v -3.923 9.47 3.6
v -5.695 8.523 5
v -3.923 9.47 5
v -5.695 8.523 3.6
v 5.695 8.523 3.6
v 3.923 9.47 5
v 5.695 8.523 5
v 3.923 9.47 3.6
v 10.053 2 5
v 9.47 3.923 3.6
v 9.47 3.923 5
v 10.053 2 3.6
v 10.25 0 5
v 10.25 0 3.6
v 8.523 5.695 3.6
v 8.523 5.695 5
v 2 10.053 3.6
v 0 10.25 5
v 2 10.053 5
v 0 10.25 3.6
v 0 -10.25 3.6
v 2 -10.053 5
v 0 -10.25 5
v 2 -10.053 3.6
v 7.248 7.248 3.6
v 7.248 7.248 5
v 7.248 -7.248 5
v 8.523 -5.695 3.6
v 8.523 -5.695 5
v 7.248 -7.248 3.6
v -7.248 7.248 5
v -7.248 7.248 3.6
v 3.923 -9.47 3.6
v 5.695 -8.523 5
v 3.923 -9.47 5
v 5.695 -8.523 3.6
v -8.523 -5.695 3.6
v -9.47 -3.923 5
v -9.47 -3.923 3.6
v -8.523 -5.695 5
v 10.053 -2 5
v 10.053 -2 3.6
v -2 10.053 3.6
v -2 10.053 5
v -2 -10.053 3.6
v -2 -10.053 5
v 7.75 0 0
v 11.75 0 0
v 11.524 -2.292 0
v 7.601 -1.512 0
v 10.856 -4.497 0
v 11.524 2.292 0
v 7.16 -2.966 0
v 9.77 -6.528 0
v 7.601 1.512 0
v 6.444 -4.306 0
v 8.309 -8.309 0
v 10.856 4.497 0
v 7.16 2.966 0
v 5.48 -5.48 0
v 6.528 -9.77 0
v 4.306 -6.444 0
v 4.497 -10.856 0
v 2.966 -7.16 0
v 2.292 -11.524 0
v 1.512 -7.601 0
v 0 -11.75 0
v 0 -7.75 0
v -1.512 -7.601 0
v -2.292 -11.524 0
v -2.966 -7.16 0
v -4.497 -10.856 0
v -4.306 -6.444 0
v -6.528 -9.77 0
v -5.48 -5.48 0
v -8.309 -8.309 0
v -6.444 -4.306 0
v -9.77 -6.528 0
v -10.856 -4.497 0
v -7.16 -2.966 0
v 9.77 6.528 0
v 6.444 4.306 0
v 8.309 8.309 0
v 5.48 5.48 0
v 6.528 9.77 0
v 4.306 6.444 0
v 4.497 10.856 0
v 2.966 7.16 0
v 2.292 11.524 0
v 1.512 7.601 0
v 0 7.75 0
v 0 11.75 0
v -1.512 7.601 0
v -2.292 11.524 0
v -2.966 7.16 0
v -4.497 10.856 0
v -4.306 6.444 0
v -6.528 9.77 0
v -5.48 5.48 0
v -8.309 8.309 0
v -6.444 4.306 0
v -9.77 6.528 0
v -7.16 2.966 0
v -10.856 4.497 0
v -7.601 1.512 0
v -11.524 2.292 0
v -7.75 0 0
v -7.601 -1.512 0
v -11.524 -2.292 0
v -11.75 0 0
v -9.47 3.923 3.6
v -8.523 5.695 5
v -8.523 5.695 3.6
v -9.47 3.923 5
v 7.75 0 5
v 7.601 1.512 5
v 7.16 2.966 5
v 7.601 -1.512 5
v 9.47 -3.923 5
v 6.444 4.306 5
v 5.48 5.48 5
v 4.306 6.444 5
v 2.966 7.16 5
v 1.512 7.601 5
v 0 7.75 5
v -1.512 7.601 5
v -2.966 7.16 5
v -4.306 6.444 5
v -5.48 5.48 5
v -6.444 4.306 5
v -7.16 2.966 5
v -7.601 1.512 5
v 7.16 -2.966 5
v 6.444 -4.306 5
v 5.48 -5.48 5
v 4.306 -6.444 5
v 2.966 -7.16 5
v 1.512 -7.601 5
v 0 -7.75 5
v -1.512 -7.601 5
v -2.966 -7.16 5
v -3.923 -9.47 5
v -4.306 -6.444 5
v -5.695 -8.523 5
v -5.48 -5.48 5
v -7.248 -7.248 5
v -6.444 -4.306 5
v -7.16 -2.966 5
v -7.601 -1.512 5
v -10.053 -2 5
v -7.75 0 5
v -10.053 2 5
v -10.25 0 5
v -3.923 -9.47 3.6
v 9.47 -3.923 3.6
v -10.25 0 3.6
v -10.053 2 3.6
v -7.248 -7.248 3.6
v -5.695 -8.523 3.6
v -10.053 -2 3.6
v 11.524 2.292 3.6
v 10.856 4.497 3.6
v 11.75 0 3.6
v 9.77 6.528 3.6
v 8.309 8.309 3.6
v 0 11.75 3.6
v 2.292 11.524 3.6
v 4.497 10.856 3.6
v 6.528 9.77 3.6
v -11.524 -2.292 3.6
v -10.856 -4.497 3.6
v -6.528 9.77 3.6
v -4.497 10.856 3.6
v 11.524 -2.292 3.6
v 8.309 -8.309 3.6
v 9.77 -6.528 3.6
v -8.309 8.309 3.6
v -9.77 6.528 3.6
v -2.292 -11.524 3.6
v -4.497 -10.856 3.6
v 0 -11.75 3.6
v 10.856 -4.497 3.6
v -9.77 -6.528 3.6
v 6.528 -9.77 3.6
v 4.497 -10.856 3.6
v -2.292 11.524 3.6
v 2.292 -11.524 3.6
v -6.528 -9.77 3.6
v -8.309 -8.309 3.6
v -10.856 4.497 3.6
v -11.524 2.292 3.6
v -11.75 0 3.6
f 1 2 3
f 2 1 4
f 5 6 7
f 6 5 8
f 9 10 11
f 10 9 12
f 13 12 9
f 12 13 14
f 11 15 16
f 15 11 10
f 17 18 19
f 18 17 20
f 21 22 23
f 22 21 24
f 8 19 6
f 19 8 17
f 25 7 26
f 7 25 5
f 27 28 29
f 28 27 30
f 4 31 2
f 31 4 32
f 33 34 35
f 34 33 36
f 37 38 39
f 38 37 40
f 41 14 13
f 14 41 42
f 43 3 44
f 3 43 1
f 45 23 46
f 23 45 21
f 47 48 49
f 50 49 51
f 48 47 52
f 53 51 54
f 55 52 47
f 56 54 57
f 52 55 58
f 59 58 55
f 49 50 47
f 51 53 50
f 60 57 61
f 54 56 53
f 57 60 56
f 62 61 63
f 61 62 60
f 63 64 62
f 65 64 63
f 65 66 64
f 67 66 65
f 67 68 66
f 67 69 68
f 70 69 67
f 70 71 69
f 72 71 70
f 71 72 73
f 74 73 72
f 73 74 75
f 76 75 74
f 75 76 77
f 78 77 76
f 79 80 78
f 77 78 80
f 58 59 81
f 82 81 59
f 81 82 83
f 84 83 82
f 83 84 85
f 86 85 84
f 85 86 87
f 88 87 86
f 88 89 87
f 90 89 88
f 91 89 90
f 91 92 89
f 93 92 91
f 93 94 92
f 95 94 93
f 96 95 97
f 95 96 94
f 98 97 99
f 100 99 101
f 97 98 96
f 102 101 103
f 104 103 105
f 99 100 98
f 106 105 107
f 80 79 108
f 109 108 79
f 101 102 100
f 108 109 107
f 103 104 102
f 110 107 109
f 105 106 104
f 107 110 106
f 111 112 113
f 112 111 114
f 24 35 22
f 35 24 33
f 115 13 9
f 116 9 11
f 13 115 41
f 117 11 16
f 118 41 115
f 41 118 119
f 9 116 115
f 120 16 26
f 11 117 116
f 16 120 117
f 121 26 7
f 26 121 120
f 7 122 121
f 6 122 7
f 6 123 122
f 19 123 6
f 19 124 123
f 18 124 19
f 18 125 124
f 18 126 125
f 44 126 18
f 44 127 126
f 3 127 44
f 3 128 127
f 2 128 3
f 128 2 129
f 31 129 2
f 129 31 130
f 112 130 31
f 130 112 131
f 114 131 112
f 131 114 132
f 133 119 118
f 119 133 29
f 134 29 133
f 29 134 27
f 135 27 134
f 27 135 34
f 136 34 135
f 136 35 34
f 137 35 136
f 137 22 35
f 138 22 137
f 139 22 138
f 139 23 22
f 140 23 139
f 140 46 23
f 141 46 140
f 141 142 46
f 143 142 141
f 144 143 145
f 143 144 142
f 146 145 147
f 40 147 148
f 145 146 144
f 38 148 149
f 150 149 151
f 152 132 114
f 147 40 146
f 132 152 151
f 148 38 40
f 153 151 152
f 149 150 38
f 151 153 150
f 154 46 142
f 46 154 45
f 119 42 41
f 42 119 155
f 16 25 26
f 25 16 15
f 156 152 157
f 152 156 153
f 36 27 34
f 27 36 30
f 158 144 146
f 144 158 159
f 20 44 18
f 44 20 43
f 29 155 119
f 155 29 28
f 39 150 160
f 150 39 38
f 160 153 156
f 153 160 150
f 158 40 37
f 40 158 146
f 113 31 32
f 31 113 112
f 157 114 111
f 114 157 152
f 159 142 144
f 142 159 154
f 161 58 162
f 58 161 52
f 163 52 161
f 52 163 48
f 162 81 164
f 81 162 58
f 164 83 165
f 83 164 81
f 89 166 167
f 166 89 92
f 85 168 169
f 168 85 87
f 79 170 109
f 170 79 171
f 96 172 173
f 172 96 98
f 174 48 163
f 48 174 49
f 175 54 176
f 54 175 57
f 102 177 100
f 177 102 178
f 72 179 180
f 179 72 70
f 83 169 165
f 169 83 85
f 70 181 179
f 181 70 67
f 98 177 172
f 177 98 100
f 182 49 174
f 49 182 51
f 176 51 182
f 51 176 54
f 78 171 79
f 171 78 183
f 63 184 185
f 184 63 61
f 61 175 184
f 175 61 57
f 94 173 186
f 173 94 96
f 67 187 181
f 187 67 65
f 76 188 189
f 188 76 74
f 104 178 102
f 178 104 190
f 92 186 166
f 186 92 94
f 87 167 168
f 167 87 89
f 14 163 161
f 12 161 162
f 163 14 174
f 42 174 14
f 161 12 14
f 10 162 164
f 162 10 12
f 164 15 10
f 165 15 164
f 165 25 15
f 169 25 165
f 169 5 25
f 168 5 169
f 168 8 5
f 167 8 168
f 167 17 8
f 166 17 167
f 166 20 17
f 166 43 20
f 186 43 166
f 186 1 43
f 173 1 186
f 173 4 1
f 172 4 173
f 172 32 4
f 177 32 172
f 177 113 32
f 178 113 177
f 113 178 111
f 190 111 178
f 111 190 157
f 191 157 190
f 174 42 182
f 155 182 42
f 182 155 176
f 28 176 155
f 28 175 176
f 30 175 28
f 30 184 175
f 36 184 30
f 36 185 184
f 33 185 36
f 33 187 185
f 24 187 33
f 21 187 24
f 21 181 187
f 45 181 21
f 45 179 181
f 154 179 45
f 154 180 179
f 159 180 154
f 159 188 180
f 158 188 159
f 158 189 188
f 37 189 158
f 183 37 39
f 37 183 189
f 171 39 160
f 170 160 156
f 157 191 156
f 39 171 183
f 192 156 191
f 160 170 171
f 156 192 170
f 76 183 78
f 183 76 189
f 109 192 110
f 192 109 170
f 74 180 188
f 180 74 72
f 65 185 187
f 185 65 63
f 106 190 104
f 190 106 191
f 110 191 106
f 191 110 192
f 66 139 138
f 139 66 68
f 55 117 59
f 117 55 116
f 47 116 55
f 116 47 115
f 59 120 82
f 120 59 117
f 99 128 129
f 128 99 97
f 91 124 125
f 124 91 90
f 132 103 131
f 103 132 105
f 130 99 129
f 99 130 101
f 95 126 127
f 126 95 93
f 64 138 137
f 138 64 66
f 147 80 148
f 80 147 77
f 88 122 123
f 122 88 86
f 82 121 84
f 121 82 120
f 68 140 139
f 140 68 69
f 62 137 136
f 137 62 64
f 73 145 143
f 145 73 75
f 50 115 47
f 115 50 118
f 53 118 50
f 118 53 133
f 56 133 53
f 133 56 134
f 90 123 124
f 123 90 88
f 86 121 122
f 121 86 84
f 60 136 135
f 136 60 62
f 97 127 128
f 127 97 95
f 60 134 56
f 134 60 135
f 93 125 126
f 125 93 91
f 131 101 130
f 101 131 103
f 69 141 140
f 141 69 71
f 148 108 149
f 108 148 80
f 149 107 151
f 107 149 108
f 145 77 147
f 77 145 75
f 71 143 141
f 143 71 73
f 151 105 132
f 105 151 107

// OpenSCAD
$fn = 32;

// ----------------------------------------------------------------------
// Spacer sleeve: 20.5 / 15.5 x 5 mm
// ----------------------------------------------------------------------

// --- parameters (mm) ---
tube_d = 20.5;            // outside diameter
bore_d = 15.5;            // shaft bore
tube_l = 5;               // sleeve length
flange_d = 23.5;          // collar diameter
flange_t = 3;             // collar thickness

module sleeve() {
  cylinder(h = tube_l, d = tube_d);
  cylinder(h = flange_t + 0.6, d = flange_d);
}

difference() {
  sleeve();
  translate([0, 0, -1]) cylinder(h = tube_l + 2, d = bore_d);
}
